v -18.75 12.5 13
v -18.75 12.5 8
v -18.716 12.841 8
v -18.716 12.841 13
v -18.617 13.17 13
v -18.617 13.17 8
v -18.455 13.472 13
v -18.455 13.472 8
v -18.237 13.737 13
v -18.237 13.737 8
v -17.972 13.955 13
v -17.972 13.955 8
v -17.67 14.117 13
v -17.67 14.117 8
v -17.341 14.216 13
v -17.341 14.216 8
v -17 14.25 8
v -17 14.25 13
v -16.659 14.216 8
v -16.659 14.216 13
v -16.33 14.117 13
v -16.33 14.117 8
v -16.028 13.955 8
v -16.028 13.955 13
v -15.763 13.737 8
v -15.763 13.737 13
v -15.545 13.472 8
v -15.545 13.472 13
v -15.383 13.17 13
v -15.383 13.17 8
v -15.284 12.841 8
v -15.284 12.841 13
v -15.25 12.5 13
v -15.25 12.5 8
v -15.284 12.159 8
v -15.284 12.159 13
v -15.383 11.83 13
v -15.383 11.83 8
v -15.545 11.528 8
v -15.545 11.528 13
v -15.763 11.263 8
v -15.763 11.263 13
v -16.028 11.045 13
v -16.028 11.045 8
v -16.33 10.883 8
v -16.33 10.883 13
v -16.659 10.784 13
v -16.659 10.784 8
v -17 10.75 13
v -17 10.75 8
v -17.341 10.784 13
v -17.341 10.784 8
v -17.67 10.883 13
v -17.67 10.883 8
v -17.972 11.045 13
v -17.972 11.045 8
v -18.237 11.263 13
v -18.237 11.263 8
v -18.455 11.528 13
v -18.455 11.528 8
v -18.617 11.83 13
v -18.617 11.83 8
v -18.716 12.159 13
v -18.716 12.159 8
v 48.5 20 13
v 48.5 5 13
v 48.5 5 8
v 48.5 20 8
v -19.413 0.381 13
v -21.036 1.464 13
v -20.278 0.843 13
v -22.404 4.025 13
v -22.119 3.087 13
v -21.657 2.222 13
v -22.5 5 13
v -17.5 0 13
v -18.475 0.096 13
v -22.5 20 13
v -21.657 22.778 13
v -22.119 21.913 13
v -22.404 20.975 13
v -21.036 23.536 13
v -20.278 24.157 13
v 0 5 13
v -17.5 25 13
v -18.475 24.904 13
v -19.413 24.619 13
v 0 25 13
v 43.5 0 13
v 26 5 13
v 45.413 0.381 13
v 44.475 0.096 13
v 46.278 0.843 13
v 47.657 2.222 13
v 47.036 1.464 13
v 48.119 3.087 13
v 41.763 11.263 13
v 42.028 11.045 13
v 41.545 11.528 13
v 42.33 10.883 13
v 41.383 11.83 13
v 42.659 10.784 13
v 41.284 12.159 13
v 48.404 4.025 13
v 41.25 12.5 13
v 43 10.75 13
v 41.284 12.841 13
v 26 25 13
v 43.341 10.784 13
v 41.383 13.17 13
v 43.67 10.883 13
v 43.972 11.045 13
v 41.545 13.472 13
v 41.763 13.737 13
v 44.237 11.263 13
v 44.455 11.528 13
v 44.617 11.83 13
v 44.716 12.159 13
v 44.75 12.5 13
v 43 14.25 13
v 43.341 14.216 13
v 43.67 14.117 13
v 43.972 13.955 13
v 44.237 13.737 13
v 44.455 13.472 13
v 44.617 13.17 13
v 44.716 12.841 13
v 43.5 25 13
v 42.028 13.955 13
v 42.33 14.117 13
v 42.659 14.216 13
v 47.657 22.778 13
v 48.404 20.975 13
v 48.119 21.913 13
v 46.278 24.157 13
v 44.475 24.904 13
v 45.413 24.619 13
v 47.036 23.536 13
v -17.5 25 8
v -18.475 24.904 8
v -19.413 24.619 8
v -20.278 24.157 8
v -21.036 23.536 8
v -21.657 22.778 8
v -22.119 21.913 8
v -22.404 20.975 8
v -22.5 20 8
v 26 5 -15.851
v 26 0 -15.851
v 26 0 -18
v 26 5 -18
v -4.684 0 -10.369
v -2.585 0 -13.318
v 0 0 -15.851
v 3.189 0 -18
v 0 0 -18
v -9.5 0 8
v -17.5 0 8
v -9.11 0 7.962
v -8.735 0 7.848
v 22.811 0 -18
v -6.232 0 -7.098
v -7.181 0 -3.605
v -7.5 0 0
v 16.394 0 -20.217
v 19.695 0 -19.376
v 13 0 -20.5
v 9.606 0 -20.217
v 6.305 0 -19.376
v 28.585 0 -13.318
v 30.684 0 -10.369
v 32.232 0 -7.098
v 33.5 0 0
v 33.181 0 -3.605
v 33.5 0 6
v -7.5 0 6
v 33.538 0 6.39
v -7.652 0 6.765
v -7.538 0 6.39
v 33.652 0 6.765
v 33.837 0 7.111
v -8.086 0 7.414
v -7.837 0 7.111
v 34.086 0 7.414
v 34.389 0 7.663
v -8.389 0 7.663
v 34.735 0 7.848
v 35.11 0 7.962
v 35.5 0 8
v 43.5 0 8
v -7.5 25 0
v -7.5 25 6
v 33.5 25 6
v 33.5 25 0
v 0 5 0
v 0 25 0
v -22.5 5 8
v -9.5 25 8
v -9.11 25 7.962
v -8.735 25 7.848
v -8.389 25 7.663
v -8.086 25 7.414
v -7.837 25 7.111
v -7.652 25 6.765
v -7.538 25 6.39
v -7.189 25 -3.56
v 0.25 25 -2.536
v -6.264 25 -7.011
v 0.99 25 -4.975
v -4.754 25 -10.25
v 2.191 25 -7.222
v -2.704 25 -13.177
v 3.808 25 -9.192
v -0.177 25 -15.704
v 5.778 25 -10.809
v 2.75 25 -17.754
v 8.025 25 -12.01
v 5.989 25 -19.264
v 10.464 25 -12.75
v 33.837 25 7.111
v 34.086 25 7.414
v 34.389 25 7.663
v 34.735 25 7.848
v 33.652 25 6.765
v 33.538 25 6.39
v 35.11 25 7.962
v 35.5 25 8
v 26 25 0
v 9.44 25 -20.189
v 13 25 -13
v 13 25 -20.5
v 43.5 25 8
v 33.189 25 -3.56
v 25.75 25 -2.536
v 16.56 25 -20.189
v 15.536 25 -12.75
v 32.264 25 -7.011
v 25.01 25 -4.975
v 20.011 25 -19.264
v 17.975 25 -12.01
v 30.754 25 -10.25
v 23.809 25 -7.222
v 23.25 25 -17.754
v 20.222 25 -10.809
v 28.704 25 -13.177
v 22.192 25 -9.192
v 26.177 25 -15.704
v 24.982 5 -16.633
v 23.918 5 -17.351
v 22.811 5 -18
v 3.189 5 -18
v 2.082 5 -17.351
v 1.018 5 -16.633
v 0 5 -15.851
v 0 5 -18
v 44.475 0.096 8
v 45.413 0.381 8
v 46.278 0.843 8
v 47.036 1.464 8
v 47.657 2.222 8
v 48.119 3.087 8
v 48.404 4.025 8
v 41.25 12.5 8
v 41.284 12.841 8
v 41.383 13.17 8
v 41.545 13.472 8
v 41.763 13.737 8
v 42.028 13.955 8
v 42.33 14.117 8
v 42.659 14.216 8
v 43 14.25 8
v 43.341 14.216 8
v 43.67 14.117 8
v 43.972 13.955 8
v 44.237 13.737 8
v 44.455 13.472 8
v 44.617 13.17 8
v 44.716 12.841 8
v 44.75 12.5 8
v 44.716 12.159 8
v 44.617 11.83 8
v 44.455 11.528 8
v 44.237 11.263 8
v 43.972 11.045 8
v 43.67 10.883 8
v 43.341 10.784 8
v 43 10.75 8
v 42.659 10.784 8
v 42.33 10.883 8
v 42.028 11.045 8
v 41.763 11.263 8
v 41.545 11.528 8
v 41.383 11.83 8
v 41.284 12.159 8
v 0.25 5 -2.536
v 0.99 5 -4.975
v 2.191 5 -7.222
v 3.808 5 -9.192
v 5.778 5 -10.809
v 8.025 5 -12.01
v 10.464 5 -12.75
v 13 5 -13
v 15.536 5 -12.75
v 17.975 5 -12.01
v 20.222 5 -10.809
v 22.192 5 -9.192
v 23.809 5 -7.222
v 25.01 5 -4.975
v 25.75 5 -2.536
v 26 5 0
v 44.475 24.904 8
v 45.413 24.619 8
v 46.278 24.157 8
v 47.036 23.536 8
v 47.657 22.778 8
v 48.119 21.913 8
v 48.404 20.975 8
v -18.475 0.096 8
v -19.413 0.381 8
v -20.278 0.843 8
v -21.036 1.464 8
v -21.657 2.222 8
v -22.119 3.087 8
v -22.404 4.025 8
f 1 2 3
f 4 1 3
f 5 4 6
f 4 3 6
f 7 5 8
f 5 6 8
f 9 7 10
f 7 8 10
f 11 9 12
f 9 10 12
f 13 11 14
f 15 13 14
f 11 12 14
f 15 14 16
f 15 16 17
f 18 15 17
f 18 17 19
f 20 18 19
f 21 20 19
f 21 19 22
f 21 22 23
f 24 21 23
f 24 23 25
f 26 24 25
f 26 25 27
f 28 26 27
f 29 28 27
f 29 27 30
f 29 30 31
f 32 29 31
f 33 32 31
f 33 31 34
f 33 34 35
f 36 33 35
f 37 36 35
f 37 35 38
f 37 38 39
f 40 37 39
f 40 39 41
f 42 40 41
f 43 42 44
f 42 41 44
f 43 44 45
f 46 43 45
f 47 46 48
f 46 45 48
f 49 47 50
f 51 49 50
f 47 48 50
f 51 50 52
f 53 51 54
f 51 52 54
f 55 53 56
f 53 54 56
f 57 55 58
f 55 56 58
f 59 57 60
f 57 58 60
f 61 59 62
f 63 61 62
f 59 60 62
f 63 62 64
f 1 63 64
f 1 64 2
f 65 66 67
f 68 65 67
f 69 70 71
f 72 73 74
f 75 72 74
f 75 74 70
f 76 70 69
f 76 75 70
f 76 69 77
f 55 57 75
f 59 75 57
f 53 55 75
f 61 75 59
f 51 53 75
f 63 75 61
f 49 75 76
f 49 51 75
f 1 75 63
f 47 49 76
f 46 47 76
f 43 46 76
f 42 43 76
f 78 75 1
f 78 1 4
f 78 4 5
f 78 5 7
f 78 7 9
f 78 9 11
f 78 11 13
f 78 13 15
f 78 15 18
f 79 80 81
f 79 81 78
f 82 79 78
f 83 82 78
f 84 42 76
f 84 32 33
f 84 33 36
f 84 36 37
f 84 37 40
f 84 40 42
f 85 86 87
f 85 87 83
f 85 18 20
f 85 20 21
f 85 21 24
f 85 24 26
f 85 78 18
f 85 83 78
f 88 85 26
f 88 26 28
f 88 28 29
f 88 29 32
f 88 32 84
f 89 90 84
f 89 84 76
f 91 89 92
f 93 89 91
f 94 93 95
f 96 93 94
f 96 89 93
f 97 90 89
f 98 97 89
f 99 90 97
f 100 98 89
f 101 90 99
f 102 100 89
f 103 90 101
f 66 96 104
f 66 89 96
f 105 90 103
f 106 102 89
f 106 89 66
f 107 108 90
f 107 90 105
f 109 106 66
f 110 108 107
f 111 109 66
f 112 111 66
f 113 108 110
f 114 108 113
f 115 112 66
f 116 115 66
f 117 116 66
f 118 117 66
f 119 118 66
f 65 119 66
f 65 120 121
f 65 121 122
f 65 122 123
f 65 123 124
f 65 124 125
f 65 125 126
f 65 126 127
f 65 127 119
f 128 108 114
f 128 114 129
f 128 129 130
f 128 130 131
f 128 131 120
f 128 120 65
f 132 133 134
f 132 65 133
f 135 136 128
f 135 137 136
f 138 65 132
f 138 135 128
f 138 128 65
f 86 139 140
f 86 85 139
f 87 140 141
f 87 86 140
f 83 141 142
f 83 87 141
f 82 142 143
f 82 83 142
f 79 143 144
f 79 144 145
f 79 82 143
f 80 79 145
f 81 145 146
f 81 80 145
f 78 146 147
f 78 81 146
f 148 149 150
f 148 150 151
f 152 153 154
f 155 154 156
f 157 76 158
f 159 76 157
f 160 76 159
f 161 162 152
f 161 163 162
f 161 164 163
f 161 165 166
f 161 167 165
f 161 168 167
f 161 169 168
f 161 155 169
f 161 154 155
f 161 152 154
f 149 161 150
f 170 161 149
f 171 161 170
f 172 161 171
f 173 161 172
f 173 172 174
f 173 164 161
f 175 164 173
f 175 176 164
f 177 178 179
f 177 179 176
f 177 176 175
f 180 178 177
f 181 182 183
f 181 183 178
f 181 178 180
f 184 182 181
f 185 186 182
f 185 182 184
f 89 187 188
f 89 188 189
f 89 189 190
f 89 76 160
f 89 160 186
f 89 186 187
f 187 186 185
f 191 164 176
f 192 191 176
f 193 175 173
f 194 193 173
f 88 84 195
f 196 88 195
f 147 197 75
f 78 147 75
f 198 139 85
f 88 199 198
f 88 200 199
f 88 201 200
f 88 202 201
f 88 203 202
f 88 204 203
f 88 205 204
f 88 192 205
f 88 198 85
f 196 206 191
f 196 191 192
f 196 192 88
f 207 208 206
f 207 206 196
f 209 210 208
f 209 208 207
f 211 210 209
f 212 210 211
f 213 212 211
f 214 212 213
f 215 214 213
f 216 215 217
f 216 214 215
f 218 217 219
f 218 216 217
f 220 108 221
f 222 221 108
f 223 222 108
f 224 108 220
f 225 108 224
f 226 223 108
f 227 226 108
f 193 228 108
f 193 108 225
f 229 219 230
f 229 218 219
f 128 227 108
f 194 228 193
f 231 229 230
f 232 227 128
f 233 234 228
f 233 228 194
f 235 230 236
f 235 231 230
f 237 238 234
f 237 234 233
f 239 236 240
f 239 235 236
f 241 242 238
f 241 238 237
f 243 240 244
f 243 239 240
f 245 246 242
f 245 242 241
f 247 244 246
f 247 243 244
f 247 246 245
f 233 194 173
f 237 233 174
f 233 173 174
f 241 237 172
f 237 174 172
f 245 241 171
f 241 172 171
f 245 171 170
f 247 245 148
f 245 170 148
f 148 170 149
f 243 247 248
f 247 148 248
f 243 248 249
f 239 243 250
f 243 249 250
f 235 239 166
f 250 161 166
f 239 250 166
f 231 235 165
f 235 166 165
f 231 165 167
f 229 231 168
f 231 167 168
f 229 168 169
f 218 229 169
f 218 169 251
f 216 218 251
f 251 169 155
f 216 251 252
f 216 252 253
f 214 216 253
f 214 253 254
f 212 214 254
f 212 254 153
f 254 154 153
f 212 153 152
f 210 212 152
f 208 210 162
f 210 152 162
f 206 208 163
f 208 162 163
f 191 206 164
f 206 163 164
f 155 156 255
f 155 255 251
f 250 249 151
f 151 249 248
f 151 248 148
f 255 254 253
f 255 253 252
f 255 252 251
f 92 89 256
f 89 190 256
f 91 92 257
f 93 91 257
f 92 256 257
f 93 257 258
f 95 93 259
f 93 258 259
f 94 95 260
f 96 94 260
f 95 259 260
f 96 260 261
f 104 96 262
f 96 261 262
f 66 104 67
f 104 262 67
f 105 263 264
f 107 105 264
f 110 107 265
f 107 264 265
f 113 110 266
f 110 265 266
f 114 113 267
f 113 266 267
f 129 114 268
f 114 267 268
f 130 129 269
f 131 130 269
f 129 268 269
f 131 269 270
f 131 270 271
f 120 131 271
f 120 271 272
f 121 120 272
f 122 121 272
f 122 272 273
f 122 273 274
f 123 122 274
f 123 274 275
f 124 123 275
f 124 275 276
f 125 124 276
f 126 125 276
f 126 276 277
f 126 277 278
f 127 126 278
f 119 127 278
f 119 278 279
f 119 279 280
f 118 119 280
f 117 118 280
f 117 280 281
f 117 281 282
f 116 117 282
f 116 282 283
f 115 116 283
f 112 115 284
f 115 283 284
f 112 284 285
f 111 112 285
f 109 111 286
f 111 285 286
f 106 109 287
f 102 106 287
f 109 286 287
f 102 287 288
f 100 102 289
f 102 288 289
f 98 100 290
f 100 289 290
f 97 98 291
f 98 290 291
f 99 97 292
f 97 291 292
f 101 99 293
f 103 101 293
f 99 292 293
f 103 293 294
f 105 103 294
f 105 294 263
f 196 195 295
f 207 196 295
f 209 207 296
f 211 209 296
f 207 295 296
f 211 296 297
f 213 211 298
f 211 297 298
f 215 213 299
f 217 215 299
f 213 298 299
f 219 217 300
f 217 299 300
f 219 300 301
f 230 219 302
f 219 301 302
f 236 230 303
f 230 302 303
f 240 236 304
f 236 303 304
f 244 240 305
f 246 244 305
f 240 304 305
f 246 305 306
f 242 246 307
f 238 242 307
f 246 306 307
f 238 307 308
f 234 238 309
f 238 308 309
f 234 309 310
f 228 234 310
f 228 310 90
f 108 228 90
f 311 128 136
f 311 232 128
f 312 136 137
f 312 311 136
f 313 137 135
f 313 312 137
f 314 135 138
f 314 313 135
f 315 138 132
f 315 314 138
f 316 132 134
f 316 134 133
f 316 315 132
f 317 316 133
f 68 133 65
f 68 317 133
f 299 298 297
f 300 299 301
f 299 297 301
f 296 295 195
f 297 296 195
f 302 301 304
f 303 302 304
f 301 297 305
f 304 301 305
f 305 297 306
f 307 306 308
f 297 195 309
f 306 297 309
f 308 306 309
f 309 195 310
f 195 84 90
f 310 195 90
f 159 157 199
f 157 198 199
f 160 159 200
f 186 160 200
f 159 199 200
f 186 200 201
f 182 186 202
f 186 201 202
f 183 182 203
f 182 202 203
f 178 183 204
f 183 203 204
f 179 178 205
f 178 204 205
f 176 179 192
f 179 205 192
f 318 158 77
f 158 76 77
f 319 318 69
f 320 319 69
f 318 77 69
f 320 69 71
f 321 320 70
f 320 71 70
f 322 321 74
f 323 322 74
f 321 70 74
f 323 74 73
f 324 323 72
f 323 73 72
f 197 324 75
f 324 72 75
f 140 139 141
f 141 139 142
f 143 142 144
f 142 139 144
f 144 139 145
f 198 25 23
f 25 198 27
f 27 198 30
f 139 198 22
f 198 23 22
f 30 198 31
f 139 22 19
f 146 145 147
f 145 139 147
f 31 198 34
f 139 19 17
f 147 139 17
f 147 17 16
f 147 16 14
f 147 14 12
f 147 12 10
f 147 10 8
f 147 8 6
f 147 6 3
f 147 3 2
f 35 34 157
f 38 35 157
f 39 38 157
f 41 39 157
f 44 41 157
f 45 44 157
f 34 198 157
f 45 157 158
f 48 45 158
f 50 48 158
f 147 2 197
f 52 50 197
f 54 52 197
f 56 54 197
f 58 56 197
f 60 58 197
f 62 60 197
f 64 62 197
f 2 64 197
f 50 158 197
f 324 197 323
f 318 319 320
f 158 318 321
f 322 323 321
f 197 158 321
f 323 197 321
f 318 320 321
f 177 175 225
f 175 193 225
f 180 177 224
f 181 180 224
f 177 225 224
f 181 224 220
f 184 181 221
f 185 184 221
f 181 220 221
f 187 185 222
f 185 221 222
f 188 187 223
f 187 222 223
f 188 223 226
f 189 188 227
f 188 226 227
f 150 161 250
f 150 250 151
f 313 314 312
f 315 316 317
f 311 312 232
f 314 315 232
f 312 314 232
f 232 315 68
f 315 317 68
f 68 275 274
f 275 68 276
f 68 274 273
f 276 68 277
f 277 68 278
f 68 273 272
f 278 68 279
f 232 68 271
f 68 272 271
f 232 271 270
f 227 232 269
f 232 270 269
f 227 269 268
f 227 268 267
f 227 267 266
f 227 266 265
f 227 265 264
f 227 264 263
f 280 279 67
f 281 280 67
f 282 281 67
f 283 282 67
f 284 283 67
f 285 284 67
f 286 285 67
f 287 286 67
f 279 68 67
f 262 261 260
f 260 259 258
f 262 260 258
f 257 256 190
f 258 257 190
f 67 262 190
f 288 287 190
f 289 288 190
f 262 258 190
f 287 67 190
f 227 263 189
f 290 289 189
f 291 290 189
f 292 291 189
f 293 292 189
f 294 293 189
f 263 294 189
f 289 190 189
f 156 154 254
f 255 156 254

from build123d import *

# Parameters (mm, degrees)
BOSS_EXTRUDE1_DEPTH = 25
SKETCH4_R           = 1.75
CUT_EXTRUDE1_DEPTH  = 6
FILLET1_R           = 5
FILLET2_R           = 2
SKETCH5_W           = 26
SKETCH5_H           = 5
BOSS_EXTRUDE2_DEPTH = 31


with BuildPart() as part:
    # Sketch1 → Boss-Extrude1 (new body)
    with BuildSketch(Plane(origin=(0, 0, 0), x_dir=(1, 0, 0), z_dir=(0, 1, 0))):
        with BuildLine():
            Line((-7.5, 0), (-7.5, -8))
            Line((-7.5, -8), (-22.5, -8))
            Line((-22.5, -8), (-22.5, -13))
            Line((-22.5, -13), (0, -13))
            Line((0, -13), (0, 0))
            ThreePointArc((0, 0), (13, 13), (26, 0))
            Line((26, 0), (26, -13))
            Line((26, -13), (48.5, -13))
            Line((48.5, -13), (48.5, -8))
            Line((48.5, -8), (33.5, -8))
            Line((33.5, -8), (33.5, 0))
            ThreePointArc((33.5, 0), (13, 20.5), (-7.5, 0))
        make_face()
    extrude(amount=BOSS_EXTRUDE1_DEPTH)

    # Sketch4 → Cut-Extrude1 (cut, through all)
    with BuildSketch(Plane(origin=(0, 0, 8), x_dir=(-1, 0, 0), z_dir=(0, 0, -1))):
        with Locations((-43, 12.5)):
            Circle(SKETCH4_R)
        with Locations((17, 12.5)):
            Circle(SKETCH4_R)
    extrude(amount=-CUT_EXTRUDE1_DEPTH, mode=Mode.SUBTRACT)

    # Fillet1
    fillet1_edges = [part.edges().sort_by_distance(p)[0] for p in [
        (-22.5, 0, 10.5),
        (48.5, 0, 10.5),
        (48.5, 25, 10.5),
        (-22.5, 25, 10.5),
    ]]
    fillet(fillet1_edges, radius=FILLET1_R)

    # Fillet2
    fillet2_edges = [part.edges().sort_by_distance(p)[0] for p in [
        (-7.5, 12.5, 8),
        (33.5, 12.5, 8),
    ]]
    fillet(fillet2_edges, radius=FILLET2_R)

    # Sketch5 → Boss-Extrude2 (add)
    with BuildSketch(Plane.XY.offset(13)):
        with Locations((13, 2.5)):
            Rectangle(SKETCH5_W, SKETCH5_H)
    extrude(amount=-BOSS_EXTRUDE2_DEPTH)


solid = part.part
